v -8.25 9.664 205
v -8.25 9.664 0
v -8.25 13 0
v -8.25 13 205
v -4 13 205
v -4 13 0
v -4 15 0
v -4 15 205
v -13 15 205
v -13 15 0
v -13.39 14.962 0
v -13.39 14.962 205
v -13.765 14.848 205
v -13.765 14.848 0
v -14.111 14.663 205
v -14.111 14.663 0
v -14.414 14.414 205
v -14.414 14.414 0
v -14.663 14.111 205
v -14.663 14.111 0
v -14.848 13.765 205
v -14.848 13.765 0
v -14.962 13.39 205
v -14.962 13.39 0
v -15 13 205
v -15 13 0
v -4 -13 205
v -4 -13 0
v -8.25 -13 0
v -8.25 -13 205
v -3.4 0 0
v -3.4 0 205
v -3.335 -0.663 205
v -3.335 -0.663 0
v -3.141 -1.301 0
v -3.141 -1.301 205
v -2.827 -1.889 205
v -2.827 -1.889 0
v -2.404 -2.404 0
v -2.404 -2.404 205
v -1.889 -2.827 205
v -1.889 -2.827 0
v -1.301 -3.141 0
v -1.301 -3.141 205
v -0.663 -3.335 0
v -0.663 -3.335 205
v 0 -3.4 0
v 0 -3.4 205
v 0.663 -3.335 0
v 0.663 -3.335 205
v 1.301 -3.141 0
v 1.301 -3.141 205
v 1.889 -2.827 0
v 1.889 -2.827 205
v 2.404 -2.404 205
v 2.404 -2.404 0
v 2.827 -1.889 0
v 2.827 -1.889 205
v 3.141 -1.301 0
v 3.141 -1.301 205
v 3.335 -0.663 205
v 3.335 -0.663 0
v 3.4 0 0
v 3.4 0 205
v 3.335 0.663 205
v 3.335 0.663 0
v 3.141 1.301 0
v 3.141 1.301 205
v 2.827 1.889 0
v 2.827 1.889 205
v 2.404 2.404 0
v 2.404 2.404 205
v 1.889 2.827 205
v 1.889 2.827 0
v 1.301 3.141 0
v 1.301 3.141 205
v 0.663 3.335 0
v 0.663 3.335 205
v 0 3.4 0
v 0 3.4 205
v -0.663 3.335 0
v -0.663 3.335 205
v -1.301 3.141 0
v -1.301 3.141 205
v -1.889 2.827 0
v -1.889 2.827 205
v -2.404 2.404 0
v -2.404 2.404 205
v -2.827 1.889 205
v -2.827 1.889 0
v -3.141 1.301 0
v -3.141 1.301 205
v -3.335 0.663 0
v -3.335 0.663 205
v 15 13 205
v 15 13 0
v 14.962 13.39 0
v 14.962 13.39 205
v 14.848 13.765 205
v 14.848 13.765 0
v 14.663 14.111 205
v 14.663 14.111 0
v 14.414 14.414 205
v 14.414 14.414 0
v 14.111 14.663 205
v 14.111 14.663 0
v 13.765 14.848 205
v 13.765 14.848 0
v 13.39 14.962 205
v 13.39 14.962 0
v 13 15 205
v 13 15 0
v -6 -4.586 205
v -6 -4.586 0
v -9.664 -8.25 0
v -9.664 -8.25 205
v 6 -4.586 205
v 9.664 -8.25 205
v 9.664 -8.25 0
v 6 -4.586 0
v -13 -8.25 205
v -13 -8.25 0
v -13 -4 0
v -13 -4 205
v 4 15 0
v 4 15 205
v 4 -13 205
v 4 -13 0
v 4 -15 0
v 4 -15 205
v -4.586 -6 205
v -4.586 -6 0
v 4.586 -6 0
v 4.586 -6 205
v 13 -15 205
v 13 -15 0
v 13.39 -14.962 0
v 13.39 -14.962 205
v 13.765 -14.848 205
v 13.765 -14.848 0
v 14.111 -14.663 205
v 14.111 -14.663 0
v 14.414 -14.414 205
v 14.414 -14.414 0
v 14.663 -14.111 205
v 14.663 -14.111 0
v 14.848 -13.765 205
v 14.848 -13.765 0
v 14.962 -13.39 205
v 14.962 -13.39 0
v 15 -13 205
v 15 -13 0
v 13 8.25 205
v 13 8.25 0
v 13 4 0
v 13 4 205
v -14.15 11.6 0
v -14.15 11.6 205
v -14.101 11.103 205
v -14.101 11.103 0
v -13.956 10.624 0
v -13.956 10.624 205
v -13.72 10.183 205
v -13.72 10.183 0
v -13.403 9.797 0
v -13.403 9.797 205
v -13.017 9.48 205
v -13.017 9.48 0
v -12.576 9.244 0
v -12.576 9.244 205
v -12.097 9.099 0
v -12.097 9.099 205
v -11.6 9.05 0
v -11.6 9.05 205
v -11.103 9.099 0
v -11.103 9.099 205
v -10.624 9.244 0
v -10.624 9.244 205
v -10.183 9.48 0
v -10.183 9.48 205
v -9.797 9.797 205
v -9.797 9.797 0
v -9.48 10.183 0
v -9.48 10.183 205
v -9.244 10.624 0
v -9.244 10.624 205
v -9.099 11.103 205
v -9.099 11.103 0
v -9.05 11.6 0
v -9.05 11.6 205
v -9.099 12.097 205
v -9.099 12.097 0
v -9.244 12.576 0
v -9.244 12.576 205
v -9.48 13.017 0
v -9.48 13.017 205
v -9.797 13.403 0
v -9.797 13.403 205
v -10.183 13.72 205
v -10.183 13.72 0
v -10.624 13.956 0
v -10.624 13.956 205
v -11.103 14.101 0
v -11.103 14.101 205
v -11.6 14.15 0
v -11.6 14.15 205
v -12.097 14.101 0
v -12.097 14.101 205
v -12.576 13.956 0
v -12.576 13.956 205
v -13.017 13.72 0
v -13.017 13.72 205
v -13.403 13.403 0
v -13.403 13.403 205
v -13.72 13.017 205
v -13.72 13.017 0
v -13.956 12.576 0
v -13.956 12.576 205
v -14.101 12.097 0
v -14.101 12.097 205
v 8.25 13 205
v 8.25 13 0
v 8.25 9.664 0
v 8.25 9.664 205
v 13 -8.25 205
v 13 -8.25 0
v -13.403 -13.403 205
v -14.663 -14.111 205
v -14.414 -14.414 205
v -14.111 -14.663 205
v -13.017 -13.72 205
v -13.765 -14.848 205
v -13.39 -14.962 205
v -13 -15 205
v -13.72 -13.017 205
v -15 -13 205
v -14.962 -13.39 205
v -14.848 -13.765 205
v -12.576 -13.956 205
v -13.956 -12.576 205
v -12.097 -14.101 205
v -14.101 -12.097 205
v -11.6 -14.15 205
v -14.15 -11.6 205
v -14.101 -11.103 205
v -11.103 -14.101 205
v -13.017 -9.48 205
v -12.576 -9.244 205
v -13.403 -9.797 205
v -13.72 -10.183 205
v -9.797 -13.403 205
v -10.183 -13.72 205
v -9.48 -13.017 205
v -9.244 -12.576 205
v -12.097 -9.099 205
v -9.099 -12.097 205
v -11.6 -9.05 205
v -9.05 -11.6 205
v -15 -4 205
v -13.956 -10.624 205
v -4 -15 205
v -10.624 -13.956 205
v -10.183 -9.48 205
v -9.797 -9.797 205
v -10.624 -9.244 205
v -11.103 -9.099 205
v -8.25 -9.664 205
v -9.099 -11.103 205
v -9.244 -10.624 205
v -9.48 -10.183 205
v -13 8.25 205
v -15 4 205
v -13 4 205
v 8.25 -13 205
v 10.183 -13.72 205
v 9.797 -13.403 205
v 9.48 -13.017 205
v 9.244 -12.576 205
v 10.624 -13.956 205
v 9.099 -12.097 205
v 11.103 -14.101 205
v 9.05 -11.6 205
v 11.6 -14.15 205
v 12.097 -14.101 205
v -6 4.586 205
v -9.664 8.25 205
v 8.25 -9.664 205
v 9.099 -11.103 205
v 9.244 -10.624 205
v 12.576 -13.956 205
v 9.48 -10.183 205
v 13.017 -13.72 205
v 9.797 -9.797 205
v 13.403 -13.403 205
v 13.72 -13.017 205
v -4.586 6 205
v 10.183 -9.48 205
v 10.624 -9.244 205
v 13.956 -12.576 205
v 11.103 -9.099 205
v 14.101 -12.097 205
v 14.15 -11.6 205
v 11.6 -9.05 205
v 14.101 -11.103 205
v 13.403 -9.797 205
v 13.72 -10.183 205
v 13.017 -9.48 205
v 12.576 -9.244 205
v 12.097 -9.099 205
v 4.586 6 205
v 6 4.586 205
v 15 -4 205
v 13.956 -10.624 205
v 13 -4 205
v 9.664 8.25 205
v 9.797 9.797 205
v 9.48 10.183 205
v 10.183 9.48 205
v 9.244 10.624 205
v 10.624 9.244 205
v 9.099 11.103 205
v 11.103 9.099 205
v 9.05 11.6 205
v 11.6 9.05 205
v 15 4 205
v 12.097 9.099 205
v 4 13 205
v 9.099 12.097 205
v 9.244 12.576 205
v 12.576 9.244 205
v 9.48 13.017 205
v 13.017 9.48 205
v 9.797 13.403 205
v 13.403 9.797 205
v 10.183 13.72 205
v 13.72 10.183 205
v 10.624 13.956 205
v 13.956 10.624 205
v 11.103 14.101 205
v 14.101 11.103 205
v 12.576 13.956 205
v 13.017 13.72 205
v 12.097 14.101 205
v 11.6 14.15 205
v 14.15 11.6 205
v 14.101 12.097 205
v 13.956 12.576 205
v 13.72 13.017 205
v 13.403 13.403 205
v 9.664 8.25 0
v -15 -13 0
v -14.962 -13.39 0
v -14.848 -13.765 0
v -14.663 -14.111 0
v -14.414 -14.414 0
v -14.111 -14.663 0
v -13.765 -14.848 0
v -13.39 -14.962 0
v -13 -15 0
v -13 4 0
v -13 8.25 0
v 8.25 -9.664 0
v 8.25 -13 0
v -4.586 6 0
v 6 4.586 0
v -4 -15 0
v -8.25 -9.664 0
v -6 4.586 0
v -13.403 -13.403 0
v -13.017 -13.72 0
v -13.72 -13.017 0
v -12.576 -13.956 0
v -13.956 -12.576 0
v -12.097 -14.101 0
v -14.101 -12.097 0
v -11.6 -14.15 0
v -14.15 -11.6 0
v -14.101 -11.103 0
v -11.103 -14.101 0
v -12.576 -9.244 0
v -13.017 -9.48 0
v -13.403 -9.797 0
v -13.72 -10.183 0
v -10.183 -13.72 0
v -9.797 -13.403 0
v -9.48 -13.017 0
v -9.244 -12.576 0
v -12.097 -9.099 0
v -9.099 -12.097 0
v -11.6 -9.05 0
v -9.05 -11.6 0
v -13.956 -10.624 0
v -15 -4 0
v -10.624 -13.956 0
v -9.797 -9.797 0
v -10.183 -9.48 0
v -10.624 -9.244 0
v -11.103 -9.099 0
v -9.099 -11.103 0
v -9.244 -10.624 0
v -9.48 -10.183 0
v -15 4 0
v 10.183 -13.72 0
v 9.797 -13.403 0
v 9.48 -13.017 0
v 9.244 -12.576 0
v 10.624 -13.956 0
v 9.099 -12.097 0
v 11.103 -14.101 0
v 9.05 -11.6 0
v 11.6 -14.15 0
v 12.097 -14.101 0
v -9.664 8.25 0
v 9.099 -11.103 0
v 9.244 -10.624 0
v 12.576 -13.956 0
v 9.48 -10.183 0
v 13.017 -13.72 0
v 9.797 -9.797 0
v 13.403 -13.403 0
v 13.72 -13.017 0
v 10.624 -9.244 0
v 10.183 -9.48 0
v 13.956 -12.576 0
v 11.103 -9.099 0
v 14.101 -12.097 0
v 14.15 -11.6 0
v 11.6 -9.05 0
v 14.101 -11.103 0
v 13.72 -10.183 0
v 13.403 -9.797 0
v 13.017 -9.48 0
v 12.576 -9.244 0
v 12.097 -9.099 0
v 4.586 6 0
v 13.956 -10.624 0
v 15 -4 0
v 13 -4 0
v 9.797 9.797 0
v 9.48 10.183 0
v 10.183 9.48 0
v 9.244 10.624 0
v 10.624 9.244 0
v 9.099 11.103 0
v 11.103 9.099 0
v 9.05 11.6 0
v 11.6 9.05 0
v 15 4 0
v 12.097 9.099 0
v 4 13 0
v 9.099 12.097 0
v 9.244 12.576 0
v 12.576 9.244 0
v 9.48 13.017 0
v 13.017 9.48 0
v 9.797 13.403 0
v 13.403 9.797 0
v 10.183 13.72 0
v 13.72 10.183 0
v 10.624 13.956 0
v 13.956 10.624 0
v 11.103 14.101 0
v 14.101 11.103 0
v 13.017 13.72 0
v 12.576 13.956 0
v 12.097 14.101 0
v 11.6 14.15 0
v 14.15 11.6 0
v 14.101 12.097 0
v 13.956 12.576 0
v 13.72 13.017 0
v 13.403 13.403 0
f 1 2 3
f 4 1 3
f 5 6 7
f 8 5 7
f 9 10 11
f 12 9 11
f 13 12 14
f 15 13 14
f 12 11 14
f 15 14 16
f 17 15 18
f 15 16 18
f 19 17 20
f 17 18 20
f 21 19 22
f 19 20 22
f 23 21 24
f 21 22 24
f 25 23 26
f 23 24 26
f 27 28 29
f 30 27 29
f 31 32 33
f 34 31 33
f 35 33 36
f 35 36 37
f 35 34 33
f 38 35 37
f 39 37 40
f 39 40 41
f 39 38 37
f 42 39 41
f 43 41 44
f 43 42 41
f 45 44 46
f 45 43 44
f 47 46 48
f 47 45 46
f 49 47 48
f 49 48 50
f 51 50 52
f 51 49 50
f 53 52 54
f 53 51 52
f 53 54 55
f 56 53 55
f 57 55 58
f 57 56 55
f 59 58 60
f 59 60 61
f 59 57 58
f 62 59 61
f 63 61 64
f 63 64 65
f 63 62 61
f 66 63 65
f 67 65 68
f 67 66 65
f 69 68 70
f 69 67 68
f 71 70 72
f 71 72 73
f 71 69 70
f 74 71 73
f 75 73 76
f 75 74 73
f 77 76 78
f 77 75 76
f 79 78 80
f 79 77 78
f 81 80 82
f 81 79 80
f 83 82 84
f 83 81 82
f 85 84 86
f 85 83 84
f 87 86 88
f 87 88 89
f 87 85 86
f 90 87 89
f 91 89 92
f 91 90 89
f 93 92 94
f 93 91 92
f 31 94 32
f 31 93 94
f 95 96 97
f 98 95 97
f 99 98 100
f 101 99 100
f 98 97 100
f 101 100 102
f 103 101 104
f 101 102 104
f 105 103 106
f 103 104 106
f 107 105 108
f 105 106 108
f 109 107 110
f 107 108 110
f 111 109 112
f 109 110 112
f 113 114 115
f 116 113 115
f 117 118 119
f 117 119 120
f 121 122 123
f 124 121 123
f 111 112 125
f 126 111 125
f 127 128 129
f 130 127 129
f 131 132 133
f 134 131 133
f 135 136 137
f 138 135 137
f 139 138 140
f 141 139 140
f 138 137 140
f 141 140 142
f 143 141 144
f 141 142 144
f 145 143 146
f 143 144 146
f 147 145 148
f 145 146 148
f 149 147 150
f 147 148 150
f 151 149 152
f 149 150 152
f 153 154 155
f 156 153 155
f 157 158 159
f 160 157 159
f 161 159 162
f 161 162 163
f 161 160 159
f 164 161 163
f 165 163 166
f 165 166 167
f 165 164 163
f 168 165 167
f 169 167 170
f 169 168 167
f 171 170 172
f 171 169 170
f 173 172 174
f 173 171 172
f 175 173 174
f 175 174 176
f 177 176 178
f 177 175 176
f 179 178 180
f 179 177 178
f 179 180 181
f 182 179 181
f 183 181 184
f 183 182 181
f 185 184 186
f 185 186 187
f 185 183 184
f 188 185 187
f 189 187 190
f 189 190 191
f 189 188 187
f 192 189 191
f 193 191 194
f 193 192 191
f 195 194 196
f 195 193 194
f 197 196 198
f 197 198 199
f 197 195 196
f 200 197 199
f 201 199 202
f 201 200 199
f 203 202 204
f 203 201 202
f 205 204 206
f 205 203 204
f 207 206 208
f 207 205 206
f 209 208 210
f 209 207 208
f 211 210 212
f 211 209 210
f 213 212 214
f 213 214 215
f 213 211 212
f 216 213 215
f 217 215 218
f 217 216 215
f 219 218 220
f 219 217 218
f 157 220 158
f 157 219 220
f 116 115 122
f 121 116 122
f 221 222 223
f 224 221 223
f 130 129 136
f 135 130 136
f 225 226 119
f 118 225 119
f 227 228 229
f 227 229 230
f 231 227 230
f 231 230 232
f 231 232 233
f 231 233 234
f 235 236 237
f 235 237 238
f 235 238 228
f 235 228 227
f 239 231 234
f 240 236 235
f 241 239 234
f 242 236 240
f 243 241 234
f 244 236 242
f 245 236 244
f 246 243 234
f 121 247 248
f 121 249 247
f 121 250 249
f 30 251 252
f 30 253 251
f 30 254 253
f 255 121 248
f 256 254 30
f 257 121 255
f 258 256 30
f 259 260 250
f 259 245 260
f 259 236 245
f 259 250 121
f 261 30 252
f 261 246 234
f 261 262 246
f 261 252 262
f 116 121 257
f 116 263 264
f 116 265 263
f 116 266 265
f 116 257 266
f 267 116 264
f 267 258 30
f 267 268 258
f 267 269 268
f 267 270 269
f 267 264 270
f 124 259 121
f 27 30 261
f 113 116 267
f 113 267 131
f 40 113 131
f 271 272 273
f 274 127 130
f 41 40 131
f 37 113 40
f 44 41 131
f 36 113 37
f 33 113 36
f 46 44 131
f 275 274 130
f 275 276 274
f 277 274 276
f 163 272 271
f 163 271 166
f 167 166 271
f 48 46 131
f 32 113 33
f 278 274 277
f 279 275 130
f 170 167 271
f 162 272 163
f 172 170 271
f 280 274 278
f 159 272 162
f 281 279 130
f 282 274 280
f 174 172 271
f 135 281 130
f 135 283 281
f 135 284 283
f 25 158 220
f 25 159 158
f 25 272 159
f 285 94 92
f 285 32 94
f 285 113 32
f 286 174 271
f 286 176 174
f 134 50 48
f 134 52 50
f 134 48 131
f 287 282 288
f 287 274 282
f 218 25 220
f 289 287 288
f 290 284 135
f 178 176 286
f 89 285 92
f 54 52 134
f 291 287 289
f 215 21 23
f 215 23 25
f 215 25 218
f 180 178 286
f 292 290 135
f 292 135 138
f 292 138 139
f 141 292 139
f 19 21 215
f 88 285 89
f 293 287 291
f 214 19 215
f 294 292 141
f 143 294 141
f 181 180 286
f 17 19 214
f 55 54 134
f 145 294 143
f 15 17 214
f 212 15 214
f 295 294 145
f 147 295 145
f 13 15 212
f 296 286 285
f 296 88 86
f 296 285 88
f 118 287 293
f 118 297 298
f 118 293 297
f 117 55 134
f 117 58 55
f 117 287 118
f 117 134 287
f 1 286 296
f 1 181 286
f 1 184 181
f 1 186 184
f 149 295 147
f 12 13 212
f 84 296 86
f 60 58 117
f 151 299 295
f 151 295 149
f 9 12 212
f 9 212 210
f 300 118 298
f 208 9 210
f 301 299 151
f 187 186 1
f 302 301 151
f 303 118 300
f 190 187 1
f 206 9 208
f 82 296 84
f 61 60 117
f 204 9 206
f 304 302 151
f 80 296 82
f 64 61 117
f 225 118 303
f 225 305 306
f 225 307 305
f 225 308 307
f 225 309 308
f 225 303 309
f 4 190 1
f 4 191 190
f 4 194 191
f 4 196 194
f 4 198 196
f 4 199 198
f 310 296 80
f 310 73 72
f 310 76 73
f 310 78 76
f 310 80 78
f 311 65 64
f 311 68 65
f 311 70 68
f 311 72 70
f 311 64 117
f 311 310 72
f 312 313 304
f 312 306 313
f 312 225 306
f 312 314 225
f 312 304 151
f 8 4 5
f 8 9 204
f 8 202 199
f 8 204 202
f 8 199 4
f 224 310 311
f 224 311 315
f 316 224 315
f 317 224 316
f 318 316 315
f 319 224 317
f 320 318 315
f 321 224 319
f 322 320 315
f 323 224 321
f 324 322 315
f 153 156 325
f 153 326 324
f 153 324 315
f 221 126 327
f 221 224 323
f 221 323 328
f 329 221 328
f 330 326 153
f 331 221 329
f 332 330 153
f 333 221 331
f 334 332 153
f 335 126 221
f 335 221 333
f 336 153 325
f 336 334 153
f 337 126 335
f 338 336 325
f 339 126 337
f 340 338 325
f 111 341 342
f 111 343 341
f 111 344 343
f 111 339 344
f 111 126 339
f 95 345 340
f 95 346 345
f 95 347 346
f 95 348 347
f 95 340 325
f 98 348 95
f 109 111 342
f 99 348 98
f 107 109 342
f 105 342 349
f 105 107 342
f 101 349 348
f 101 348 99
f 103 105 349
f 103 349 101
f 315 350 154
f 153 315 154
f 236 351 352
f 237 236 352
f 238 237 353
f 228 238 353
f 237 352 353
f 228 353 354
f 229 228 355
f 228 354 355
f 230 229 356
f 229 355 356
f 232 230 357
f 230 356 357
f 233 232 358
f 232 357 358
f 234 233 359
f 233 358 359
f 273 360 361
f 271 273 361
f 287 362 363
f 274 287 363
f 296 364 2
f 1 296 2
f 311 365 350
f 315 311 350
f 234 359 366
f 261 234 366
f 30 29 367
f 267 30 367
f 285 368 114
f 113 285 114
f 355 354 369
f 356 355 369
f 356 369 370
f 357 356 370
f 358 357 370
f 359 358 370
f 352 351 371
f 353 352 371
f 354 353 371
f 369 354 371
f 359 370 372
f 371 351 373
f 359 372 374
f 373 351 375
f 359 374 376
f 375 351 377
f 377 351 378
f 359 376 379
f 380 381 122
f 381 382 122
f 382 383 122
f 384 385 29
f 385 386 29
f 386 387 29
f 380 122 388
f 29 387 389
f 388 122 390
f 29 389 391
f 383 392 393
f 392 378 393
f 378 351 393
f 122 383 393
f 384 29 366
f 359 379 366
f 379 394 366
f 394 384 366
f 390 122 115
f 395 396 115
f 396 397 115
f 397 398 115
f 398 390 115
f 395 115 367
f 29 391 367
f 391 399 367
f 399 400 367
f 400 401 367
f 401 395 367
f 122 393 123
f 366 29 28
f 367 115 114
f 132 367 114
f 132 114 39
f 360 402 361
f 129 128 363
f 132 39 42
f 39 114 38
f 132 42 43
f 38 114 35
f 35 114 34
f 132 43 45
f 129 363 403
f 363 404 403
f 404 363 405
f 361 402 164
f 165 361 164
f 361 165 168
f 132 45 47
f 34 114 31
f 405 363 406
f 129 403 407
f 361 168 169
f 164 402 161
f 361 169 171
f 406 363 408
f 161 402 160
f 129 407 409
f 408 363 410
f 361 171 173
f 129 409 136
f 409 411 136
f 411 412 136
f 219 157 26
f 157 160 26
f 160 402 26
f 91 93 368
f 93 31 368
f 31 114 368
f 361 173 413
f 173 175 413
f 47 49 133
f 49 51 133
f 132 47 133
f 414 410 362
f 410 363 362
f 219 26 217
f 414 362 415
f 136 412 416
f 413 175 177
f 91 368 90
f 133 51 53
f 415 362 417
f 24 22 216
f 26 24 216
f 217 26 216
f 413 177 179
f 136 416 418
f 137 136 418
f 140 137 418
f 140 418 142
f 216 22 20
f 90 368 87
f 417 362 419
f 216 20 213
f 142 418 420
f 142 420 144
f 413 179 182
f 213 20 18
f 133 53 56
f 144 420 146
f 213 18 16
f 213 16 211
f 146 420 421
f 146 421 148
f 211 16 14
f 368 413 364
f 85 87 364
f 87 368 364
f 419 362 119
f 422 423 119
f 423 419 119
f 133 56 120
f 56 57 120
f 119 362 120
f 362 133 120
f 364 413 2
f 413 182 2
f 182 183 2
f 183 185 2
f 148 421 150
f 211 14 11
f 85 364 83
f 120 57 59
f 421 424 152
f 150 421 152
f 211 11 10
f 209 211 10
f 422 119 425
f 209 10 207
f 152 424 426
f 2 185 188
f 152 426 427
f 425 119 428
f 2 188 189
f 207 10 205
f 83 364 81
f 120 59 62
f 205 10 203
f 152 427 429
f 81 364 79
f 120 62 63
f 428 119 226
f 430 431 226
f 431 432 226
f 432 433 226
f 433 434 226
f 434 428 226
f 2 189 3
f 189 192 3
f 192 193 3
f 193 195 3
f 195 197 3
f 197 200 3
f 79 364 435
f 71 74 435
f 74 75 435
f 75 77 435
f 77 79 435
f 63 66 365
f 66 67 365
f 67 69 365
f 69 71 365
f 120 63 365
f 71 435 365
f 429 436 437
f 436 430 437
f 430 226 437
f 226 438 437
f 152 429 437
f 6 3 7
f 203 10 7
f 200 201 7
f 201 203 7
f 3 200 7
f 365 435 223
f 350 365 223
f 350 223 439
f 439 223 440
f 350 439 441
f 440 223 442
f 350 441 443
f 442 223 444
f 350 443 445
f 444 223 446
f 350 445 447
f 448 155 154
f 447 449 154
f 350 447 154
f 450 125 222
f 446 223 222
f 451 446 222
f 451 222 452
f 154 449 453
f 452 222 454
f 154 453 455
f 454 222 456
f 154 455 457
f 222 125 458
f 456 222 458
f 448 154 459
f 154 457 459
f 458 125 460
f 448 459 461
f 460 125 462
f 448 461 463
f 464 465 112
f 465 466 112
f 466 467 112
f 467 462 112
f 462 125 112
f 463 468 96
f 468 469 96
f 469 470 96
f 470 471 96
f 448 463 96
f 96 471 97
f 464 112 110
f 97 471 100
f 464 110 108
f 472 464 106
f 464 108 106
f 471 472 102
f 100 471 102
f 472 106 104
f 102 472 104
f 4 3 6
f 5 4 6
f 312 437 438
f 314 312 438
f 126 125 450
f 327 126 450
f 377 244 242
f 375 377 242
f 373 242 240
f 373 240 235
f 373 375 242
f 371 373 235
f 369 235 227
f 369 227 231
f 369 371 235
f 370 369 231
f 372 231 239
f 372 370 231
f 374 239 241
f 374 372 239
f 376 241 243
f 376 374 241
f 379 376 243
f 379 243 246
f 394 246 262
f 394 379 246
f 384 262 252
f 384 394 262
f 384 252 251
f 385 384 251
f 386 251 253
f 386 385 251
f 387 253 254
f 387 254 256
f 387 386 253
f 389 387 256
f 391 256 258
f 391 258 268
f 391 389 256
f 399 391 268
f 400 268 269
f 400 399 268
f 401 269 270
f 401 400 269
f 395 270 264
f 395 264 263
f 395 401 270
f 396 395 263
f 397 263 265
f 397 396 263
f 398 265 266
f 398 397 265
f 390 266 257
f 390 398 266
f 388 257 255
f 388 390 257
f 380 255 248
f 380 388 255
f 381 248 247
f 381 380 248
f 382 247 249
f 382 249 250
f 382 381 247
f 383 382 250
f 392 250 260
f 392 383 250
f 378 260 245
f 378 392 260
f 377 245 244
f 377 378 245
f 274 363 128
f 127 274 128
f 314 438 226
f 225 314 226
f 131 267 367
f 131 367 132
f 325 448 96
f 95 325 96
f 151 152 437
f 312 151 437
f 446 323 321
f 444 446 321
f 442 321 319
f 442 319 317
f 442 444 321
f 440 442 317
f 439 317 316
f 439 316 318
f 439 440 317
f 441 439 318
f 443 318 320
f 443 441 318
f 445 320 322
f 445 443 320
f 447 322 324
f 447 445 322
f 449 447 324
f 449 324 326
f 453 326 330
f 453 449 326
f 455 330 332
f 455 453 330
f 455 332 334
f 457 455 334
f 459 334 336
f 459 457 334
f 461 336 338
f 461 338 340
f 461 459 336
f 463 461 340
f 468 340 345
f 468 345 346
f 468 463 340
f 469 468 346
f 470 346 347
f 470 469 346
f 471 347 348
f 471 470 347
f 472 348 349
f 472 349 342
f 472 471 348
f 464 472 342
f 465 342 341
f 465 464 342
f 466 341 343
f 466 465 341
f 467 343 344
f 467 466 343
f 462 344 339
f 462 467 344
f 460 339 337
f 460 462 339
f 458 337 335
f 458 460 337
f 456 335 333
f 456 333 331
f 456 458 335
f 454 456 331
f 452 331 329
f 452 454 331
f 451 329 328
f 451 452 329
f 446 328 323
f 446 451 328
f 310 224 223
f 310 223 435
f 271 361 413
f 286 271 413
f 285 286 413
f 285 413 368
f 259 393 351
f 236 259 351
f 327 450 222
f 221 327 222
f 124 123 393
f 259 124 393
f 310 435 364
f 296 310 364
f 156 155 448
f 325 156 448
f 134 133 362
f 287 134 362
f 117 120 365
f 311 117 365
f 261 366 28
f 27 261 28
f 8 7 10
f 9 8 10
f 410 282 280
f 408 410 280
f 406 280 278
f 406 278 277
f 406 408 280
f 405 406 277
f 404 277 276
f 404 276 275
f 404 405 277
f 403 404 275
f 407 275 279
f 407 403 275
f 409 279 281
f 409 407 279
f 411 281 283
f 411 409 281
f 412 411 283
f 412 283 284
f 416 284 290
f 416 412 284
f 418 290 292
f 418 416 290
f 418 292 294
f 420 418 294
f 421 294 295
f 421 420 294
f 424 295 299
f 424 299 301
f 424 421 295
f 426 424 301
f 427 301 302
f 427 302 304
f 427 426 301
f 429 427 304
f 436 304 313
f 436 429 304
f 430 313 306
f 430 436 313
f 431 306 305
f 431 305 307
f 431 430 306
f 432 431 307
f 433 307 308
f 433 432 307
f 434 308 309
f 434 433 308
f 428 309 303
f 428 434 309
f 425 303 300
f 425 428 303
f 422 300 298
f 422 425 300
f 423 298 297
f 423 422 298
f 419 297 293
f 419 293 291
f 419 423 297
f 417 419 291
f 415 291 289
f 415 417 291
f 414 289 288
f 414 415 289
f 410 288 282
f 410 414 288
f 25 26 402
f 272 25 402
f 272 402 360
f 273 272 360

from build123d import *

# Parameters (mm, degrees)
SKETCH1_R           = 2.55
SKETCH1_R_2         = 3.4
BOSS_EXTRUDE1_DEPTH = 205


with BuildPart() as part:
    # Sketch1 → Boss-Extrude1 (new body)
    with BuildSketch(Plane.XY):
        with BuildLine():
            Line((13, 4), (15, 4))
            Line((15, 4), (15, 13))
            ThreePointArc((15, 13), (14.414213562, 14.414213562), (13, 15))
            Line((13, 15), (4, 15))
            Line((4, 15), (4, 13))
            Line((4, 13), (8.25, 13))
            Line((8.25, 13), (8.25, 9.664213562))
            Line((8.25, 9.664213562), (4.585786438, 6))
            Line((4.585786438, 6), (-4.585786438, 6))
            Line((-4.585786438, 6), (-8.25, 9.664213562))
            Line((-8.25, 9.664213562), (-8.25, 13))
            Line((-8.25, 13), (-4, 13))
            Line((-4, 13), (-4, 15))
            Line((-4, 15), (-13, 15))
            ThreePointArc((-13, 15), (-14.414213562, 14.414213562), (-15, 13))
            Line((-15, 13), (-15, 4))
            Line((-15, 4), (-13, 4))
            Line((-13, 4), (-13, 8.25))
            Line((-13, 8.25), (-9.664213562, 8.25))
            Line((-9.664213562, 8.25), (-6, 4.585786438))
            Line((-6, 4.585786438), (-6, -4.585786438))
            Line((-6, -4.585786438), (-9.664213562, -8.25))
            Line((-9.664213562, -8.25), (-13, -8.25))
            Line((-13, -8.25), (-13, -4))
            Line((-13, -4), (-15, -4))
            Line((-15, -4), (-15, -13))
            ThreePointArc((-15, -13), (-14.414213562, -14.414213562), (-13, -15))
            Line((-13, -15), (-4, -15))
            Line((-4, -15), (-4, -13))
            Line((-4, -13), (-8.25, -13))
            Line((-8.25, -13), (-8.25, -9.664213562))
            Line((-8.25, -9.664213562), (-4.585786438, -6))
            Line((-4.585786438, -6), (4.585786438, -6))
            Line((4.585786438, -6), (8.25, -9.664213562))
            Line((8.25, -9.664213562), (8.25, -13))
            Line((8.25, -13), (4, -13))
            Line((4, -13), (4, -15))
            Line((4, -15), (13, -15))
            ThreePointArc((13, -15), (14.414213562, -14.414213562), (15, -13))
            Line((15, -13), (15, -4))
            Line((15, -4), (13, -4))
            Line((13, -4), (13, -8.25))
            Line((13, -8.25), (9.664213562, -8.25))
            Line((9.664213562, -8.25), (6, -4.585786438))
            Line((6, -4.585786438), (6, 4.585786438))
            Line((6, 4.585786438), (9.664213562, 8.25))
            Line((9.664213562, 8.25), (13, 8.25))
            Line((13, 8.25), (13, 4))
        make_face()
        with Locations(Location((-11.6, 11.6, 0), (0, 0, 180))):  # turned: the seam where the file's is
            Circle(SKETCH1_R, mode=Mode.SUBTRACT)
        with Locations(Location((11.6, -11.6, 0), (0, 0, 180))):  # turned: the seam where the file's is
            Circle(SKETCH1_R, mode=Mode.SUBTRACT)
        with Locations(Location((-11.6, -11.6, 0), (0, 0, 180))):  # turned: the seam where the file's is
            Circle(SKETCH1_R, mode=Mode.SUBTRACT)
        with Locations(Location((11.6, 11.6, 0), (0, 0, 180))):  # turned: the seam where the file's is
            Circle(SKETCH1_R, mode=Mode.SUBTRACT)
        with Locations(Location((0, 0, 0), (0, 0, 180))):  # turned: the seam where the file's is
            Circle(SKETCH1_R_2, mode=Mode.SUBTRACT)
    extrude(amount=BOSS_EXTRUDE1_DEPTH)


solid = part.part
